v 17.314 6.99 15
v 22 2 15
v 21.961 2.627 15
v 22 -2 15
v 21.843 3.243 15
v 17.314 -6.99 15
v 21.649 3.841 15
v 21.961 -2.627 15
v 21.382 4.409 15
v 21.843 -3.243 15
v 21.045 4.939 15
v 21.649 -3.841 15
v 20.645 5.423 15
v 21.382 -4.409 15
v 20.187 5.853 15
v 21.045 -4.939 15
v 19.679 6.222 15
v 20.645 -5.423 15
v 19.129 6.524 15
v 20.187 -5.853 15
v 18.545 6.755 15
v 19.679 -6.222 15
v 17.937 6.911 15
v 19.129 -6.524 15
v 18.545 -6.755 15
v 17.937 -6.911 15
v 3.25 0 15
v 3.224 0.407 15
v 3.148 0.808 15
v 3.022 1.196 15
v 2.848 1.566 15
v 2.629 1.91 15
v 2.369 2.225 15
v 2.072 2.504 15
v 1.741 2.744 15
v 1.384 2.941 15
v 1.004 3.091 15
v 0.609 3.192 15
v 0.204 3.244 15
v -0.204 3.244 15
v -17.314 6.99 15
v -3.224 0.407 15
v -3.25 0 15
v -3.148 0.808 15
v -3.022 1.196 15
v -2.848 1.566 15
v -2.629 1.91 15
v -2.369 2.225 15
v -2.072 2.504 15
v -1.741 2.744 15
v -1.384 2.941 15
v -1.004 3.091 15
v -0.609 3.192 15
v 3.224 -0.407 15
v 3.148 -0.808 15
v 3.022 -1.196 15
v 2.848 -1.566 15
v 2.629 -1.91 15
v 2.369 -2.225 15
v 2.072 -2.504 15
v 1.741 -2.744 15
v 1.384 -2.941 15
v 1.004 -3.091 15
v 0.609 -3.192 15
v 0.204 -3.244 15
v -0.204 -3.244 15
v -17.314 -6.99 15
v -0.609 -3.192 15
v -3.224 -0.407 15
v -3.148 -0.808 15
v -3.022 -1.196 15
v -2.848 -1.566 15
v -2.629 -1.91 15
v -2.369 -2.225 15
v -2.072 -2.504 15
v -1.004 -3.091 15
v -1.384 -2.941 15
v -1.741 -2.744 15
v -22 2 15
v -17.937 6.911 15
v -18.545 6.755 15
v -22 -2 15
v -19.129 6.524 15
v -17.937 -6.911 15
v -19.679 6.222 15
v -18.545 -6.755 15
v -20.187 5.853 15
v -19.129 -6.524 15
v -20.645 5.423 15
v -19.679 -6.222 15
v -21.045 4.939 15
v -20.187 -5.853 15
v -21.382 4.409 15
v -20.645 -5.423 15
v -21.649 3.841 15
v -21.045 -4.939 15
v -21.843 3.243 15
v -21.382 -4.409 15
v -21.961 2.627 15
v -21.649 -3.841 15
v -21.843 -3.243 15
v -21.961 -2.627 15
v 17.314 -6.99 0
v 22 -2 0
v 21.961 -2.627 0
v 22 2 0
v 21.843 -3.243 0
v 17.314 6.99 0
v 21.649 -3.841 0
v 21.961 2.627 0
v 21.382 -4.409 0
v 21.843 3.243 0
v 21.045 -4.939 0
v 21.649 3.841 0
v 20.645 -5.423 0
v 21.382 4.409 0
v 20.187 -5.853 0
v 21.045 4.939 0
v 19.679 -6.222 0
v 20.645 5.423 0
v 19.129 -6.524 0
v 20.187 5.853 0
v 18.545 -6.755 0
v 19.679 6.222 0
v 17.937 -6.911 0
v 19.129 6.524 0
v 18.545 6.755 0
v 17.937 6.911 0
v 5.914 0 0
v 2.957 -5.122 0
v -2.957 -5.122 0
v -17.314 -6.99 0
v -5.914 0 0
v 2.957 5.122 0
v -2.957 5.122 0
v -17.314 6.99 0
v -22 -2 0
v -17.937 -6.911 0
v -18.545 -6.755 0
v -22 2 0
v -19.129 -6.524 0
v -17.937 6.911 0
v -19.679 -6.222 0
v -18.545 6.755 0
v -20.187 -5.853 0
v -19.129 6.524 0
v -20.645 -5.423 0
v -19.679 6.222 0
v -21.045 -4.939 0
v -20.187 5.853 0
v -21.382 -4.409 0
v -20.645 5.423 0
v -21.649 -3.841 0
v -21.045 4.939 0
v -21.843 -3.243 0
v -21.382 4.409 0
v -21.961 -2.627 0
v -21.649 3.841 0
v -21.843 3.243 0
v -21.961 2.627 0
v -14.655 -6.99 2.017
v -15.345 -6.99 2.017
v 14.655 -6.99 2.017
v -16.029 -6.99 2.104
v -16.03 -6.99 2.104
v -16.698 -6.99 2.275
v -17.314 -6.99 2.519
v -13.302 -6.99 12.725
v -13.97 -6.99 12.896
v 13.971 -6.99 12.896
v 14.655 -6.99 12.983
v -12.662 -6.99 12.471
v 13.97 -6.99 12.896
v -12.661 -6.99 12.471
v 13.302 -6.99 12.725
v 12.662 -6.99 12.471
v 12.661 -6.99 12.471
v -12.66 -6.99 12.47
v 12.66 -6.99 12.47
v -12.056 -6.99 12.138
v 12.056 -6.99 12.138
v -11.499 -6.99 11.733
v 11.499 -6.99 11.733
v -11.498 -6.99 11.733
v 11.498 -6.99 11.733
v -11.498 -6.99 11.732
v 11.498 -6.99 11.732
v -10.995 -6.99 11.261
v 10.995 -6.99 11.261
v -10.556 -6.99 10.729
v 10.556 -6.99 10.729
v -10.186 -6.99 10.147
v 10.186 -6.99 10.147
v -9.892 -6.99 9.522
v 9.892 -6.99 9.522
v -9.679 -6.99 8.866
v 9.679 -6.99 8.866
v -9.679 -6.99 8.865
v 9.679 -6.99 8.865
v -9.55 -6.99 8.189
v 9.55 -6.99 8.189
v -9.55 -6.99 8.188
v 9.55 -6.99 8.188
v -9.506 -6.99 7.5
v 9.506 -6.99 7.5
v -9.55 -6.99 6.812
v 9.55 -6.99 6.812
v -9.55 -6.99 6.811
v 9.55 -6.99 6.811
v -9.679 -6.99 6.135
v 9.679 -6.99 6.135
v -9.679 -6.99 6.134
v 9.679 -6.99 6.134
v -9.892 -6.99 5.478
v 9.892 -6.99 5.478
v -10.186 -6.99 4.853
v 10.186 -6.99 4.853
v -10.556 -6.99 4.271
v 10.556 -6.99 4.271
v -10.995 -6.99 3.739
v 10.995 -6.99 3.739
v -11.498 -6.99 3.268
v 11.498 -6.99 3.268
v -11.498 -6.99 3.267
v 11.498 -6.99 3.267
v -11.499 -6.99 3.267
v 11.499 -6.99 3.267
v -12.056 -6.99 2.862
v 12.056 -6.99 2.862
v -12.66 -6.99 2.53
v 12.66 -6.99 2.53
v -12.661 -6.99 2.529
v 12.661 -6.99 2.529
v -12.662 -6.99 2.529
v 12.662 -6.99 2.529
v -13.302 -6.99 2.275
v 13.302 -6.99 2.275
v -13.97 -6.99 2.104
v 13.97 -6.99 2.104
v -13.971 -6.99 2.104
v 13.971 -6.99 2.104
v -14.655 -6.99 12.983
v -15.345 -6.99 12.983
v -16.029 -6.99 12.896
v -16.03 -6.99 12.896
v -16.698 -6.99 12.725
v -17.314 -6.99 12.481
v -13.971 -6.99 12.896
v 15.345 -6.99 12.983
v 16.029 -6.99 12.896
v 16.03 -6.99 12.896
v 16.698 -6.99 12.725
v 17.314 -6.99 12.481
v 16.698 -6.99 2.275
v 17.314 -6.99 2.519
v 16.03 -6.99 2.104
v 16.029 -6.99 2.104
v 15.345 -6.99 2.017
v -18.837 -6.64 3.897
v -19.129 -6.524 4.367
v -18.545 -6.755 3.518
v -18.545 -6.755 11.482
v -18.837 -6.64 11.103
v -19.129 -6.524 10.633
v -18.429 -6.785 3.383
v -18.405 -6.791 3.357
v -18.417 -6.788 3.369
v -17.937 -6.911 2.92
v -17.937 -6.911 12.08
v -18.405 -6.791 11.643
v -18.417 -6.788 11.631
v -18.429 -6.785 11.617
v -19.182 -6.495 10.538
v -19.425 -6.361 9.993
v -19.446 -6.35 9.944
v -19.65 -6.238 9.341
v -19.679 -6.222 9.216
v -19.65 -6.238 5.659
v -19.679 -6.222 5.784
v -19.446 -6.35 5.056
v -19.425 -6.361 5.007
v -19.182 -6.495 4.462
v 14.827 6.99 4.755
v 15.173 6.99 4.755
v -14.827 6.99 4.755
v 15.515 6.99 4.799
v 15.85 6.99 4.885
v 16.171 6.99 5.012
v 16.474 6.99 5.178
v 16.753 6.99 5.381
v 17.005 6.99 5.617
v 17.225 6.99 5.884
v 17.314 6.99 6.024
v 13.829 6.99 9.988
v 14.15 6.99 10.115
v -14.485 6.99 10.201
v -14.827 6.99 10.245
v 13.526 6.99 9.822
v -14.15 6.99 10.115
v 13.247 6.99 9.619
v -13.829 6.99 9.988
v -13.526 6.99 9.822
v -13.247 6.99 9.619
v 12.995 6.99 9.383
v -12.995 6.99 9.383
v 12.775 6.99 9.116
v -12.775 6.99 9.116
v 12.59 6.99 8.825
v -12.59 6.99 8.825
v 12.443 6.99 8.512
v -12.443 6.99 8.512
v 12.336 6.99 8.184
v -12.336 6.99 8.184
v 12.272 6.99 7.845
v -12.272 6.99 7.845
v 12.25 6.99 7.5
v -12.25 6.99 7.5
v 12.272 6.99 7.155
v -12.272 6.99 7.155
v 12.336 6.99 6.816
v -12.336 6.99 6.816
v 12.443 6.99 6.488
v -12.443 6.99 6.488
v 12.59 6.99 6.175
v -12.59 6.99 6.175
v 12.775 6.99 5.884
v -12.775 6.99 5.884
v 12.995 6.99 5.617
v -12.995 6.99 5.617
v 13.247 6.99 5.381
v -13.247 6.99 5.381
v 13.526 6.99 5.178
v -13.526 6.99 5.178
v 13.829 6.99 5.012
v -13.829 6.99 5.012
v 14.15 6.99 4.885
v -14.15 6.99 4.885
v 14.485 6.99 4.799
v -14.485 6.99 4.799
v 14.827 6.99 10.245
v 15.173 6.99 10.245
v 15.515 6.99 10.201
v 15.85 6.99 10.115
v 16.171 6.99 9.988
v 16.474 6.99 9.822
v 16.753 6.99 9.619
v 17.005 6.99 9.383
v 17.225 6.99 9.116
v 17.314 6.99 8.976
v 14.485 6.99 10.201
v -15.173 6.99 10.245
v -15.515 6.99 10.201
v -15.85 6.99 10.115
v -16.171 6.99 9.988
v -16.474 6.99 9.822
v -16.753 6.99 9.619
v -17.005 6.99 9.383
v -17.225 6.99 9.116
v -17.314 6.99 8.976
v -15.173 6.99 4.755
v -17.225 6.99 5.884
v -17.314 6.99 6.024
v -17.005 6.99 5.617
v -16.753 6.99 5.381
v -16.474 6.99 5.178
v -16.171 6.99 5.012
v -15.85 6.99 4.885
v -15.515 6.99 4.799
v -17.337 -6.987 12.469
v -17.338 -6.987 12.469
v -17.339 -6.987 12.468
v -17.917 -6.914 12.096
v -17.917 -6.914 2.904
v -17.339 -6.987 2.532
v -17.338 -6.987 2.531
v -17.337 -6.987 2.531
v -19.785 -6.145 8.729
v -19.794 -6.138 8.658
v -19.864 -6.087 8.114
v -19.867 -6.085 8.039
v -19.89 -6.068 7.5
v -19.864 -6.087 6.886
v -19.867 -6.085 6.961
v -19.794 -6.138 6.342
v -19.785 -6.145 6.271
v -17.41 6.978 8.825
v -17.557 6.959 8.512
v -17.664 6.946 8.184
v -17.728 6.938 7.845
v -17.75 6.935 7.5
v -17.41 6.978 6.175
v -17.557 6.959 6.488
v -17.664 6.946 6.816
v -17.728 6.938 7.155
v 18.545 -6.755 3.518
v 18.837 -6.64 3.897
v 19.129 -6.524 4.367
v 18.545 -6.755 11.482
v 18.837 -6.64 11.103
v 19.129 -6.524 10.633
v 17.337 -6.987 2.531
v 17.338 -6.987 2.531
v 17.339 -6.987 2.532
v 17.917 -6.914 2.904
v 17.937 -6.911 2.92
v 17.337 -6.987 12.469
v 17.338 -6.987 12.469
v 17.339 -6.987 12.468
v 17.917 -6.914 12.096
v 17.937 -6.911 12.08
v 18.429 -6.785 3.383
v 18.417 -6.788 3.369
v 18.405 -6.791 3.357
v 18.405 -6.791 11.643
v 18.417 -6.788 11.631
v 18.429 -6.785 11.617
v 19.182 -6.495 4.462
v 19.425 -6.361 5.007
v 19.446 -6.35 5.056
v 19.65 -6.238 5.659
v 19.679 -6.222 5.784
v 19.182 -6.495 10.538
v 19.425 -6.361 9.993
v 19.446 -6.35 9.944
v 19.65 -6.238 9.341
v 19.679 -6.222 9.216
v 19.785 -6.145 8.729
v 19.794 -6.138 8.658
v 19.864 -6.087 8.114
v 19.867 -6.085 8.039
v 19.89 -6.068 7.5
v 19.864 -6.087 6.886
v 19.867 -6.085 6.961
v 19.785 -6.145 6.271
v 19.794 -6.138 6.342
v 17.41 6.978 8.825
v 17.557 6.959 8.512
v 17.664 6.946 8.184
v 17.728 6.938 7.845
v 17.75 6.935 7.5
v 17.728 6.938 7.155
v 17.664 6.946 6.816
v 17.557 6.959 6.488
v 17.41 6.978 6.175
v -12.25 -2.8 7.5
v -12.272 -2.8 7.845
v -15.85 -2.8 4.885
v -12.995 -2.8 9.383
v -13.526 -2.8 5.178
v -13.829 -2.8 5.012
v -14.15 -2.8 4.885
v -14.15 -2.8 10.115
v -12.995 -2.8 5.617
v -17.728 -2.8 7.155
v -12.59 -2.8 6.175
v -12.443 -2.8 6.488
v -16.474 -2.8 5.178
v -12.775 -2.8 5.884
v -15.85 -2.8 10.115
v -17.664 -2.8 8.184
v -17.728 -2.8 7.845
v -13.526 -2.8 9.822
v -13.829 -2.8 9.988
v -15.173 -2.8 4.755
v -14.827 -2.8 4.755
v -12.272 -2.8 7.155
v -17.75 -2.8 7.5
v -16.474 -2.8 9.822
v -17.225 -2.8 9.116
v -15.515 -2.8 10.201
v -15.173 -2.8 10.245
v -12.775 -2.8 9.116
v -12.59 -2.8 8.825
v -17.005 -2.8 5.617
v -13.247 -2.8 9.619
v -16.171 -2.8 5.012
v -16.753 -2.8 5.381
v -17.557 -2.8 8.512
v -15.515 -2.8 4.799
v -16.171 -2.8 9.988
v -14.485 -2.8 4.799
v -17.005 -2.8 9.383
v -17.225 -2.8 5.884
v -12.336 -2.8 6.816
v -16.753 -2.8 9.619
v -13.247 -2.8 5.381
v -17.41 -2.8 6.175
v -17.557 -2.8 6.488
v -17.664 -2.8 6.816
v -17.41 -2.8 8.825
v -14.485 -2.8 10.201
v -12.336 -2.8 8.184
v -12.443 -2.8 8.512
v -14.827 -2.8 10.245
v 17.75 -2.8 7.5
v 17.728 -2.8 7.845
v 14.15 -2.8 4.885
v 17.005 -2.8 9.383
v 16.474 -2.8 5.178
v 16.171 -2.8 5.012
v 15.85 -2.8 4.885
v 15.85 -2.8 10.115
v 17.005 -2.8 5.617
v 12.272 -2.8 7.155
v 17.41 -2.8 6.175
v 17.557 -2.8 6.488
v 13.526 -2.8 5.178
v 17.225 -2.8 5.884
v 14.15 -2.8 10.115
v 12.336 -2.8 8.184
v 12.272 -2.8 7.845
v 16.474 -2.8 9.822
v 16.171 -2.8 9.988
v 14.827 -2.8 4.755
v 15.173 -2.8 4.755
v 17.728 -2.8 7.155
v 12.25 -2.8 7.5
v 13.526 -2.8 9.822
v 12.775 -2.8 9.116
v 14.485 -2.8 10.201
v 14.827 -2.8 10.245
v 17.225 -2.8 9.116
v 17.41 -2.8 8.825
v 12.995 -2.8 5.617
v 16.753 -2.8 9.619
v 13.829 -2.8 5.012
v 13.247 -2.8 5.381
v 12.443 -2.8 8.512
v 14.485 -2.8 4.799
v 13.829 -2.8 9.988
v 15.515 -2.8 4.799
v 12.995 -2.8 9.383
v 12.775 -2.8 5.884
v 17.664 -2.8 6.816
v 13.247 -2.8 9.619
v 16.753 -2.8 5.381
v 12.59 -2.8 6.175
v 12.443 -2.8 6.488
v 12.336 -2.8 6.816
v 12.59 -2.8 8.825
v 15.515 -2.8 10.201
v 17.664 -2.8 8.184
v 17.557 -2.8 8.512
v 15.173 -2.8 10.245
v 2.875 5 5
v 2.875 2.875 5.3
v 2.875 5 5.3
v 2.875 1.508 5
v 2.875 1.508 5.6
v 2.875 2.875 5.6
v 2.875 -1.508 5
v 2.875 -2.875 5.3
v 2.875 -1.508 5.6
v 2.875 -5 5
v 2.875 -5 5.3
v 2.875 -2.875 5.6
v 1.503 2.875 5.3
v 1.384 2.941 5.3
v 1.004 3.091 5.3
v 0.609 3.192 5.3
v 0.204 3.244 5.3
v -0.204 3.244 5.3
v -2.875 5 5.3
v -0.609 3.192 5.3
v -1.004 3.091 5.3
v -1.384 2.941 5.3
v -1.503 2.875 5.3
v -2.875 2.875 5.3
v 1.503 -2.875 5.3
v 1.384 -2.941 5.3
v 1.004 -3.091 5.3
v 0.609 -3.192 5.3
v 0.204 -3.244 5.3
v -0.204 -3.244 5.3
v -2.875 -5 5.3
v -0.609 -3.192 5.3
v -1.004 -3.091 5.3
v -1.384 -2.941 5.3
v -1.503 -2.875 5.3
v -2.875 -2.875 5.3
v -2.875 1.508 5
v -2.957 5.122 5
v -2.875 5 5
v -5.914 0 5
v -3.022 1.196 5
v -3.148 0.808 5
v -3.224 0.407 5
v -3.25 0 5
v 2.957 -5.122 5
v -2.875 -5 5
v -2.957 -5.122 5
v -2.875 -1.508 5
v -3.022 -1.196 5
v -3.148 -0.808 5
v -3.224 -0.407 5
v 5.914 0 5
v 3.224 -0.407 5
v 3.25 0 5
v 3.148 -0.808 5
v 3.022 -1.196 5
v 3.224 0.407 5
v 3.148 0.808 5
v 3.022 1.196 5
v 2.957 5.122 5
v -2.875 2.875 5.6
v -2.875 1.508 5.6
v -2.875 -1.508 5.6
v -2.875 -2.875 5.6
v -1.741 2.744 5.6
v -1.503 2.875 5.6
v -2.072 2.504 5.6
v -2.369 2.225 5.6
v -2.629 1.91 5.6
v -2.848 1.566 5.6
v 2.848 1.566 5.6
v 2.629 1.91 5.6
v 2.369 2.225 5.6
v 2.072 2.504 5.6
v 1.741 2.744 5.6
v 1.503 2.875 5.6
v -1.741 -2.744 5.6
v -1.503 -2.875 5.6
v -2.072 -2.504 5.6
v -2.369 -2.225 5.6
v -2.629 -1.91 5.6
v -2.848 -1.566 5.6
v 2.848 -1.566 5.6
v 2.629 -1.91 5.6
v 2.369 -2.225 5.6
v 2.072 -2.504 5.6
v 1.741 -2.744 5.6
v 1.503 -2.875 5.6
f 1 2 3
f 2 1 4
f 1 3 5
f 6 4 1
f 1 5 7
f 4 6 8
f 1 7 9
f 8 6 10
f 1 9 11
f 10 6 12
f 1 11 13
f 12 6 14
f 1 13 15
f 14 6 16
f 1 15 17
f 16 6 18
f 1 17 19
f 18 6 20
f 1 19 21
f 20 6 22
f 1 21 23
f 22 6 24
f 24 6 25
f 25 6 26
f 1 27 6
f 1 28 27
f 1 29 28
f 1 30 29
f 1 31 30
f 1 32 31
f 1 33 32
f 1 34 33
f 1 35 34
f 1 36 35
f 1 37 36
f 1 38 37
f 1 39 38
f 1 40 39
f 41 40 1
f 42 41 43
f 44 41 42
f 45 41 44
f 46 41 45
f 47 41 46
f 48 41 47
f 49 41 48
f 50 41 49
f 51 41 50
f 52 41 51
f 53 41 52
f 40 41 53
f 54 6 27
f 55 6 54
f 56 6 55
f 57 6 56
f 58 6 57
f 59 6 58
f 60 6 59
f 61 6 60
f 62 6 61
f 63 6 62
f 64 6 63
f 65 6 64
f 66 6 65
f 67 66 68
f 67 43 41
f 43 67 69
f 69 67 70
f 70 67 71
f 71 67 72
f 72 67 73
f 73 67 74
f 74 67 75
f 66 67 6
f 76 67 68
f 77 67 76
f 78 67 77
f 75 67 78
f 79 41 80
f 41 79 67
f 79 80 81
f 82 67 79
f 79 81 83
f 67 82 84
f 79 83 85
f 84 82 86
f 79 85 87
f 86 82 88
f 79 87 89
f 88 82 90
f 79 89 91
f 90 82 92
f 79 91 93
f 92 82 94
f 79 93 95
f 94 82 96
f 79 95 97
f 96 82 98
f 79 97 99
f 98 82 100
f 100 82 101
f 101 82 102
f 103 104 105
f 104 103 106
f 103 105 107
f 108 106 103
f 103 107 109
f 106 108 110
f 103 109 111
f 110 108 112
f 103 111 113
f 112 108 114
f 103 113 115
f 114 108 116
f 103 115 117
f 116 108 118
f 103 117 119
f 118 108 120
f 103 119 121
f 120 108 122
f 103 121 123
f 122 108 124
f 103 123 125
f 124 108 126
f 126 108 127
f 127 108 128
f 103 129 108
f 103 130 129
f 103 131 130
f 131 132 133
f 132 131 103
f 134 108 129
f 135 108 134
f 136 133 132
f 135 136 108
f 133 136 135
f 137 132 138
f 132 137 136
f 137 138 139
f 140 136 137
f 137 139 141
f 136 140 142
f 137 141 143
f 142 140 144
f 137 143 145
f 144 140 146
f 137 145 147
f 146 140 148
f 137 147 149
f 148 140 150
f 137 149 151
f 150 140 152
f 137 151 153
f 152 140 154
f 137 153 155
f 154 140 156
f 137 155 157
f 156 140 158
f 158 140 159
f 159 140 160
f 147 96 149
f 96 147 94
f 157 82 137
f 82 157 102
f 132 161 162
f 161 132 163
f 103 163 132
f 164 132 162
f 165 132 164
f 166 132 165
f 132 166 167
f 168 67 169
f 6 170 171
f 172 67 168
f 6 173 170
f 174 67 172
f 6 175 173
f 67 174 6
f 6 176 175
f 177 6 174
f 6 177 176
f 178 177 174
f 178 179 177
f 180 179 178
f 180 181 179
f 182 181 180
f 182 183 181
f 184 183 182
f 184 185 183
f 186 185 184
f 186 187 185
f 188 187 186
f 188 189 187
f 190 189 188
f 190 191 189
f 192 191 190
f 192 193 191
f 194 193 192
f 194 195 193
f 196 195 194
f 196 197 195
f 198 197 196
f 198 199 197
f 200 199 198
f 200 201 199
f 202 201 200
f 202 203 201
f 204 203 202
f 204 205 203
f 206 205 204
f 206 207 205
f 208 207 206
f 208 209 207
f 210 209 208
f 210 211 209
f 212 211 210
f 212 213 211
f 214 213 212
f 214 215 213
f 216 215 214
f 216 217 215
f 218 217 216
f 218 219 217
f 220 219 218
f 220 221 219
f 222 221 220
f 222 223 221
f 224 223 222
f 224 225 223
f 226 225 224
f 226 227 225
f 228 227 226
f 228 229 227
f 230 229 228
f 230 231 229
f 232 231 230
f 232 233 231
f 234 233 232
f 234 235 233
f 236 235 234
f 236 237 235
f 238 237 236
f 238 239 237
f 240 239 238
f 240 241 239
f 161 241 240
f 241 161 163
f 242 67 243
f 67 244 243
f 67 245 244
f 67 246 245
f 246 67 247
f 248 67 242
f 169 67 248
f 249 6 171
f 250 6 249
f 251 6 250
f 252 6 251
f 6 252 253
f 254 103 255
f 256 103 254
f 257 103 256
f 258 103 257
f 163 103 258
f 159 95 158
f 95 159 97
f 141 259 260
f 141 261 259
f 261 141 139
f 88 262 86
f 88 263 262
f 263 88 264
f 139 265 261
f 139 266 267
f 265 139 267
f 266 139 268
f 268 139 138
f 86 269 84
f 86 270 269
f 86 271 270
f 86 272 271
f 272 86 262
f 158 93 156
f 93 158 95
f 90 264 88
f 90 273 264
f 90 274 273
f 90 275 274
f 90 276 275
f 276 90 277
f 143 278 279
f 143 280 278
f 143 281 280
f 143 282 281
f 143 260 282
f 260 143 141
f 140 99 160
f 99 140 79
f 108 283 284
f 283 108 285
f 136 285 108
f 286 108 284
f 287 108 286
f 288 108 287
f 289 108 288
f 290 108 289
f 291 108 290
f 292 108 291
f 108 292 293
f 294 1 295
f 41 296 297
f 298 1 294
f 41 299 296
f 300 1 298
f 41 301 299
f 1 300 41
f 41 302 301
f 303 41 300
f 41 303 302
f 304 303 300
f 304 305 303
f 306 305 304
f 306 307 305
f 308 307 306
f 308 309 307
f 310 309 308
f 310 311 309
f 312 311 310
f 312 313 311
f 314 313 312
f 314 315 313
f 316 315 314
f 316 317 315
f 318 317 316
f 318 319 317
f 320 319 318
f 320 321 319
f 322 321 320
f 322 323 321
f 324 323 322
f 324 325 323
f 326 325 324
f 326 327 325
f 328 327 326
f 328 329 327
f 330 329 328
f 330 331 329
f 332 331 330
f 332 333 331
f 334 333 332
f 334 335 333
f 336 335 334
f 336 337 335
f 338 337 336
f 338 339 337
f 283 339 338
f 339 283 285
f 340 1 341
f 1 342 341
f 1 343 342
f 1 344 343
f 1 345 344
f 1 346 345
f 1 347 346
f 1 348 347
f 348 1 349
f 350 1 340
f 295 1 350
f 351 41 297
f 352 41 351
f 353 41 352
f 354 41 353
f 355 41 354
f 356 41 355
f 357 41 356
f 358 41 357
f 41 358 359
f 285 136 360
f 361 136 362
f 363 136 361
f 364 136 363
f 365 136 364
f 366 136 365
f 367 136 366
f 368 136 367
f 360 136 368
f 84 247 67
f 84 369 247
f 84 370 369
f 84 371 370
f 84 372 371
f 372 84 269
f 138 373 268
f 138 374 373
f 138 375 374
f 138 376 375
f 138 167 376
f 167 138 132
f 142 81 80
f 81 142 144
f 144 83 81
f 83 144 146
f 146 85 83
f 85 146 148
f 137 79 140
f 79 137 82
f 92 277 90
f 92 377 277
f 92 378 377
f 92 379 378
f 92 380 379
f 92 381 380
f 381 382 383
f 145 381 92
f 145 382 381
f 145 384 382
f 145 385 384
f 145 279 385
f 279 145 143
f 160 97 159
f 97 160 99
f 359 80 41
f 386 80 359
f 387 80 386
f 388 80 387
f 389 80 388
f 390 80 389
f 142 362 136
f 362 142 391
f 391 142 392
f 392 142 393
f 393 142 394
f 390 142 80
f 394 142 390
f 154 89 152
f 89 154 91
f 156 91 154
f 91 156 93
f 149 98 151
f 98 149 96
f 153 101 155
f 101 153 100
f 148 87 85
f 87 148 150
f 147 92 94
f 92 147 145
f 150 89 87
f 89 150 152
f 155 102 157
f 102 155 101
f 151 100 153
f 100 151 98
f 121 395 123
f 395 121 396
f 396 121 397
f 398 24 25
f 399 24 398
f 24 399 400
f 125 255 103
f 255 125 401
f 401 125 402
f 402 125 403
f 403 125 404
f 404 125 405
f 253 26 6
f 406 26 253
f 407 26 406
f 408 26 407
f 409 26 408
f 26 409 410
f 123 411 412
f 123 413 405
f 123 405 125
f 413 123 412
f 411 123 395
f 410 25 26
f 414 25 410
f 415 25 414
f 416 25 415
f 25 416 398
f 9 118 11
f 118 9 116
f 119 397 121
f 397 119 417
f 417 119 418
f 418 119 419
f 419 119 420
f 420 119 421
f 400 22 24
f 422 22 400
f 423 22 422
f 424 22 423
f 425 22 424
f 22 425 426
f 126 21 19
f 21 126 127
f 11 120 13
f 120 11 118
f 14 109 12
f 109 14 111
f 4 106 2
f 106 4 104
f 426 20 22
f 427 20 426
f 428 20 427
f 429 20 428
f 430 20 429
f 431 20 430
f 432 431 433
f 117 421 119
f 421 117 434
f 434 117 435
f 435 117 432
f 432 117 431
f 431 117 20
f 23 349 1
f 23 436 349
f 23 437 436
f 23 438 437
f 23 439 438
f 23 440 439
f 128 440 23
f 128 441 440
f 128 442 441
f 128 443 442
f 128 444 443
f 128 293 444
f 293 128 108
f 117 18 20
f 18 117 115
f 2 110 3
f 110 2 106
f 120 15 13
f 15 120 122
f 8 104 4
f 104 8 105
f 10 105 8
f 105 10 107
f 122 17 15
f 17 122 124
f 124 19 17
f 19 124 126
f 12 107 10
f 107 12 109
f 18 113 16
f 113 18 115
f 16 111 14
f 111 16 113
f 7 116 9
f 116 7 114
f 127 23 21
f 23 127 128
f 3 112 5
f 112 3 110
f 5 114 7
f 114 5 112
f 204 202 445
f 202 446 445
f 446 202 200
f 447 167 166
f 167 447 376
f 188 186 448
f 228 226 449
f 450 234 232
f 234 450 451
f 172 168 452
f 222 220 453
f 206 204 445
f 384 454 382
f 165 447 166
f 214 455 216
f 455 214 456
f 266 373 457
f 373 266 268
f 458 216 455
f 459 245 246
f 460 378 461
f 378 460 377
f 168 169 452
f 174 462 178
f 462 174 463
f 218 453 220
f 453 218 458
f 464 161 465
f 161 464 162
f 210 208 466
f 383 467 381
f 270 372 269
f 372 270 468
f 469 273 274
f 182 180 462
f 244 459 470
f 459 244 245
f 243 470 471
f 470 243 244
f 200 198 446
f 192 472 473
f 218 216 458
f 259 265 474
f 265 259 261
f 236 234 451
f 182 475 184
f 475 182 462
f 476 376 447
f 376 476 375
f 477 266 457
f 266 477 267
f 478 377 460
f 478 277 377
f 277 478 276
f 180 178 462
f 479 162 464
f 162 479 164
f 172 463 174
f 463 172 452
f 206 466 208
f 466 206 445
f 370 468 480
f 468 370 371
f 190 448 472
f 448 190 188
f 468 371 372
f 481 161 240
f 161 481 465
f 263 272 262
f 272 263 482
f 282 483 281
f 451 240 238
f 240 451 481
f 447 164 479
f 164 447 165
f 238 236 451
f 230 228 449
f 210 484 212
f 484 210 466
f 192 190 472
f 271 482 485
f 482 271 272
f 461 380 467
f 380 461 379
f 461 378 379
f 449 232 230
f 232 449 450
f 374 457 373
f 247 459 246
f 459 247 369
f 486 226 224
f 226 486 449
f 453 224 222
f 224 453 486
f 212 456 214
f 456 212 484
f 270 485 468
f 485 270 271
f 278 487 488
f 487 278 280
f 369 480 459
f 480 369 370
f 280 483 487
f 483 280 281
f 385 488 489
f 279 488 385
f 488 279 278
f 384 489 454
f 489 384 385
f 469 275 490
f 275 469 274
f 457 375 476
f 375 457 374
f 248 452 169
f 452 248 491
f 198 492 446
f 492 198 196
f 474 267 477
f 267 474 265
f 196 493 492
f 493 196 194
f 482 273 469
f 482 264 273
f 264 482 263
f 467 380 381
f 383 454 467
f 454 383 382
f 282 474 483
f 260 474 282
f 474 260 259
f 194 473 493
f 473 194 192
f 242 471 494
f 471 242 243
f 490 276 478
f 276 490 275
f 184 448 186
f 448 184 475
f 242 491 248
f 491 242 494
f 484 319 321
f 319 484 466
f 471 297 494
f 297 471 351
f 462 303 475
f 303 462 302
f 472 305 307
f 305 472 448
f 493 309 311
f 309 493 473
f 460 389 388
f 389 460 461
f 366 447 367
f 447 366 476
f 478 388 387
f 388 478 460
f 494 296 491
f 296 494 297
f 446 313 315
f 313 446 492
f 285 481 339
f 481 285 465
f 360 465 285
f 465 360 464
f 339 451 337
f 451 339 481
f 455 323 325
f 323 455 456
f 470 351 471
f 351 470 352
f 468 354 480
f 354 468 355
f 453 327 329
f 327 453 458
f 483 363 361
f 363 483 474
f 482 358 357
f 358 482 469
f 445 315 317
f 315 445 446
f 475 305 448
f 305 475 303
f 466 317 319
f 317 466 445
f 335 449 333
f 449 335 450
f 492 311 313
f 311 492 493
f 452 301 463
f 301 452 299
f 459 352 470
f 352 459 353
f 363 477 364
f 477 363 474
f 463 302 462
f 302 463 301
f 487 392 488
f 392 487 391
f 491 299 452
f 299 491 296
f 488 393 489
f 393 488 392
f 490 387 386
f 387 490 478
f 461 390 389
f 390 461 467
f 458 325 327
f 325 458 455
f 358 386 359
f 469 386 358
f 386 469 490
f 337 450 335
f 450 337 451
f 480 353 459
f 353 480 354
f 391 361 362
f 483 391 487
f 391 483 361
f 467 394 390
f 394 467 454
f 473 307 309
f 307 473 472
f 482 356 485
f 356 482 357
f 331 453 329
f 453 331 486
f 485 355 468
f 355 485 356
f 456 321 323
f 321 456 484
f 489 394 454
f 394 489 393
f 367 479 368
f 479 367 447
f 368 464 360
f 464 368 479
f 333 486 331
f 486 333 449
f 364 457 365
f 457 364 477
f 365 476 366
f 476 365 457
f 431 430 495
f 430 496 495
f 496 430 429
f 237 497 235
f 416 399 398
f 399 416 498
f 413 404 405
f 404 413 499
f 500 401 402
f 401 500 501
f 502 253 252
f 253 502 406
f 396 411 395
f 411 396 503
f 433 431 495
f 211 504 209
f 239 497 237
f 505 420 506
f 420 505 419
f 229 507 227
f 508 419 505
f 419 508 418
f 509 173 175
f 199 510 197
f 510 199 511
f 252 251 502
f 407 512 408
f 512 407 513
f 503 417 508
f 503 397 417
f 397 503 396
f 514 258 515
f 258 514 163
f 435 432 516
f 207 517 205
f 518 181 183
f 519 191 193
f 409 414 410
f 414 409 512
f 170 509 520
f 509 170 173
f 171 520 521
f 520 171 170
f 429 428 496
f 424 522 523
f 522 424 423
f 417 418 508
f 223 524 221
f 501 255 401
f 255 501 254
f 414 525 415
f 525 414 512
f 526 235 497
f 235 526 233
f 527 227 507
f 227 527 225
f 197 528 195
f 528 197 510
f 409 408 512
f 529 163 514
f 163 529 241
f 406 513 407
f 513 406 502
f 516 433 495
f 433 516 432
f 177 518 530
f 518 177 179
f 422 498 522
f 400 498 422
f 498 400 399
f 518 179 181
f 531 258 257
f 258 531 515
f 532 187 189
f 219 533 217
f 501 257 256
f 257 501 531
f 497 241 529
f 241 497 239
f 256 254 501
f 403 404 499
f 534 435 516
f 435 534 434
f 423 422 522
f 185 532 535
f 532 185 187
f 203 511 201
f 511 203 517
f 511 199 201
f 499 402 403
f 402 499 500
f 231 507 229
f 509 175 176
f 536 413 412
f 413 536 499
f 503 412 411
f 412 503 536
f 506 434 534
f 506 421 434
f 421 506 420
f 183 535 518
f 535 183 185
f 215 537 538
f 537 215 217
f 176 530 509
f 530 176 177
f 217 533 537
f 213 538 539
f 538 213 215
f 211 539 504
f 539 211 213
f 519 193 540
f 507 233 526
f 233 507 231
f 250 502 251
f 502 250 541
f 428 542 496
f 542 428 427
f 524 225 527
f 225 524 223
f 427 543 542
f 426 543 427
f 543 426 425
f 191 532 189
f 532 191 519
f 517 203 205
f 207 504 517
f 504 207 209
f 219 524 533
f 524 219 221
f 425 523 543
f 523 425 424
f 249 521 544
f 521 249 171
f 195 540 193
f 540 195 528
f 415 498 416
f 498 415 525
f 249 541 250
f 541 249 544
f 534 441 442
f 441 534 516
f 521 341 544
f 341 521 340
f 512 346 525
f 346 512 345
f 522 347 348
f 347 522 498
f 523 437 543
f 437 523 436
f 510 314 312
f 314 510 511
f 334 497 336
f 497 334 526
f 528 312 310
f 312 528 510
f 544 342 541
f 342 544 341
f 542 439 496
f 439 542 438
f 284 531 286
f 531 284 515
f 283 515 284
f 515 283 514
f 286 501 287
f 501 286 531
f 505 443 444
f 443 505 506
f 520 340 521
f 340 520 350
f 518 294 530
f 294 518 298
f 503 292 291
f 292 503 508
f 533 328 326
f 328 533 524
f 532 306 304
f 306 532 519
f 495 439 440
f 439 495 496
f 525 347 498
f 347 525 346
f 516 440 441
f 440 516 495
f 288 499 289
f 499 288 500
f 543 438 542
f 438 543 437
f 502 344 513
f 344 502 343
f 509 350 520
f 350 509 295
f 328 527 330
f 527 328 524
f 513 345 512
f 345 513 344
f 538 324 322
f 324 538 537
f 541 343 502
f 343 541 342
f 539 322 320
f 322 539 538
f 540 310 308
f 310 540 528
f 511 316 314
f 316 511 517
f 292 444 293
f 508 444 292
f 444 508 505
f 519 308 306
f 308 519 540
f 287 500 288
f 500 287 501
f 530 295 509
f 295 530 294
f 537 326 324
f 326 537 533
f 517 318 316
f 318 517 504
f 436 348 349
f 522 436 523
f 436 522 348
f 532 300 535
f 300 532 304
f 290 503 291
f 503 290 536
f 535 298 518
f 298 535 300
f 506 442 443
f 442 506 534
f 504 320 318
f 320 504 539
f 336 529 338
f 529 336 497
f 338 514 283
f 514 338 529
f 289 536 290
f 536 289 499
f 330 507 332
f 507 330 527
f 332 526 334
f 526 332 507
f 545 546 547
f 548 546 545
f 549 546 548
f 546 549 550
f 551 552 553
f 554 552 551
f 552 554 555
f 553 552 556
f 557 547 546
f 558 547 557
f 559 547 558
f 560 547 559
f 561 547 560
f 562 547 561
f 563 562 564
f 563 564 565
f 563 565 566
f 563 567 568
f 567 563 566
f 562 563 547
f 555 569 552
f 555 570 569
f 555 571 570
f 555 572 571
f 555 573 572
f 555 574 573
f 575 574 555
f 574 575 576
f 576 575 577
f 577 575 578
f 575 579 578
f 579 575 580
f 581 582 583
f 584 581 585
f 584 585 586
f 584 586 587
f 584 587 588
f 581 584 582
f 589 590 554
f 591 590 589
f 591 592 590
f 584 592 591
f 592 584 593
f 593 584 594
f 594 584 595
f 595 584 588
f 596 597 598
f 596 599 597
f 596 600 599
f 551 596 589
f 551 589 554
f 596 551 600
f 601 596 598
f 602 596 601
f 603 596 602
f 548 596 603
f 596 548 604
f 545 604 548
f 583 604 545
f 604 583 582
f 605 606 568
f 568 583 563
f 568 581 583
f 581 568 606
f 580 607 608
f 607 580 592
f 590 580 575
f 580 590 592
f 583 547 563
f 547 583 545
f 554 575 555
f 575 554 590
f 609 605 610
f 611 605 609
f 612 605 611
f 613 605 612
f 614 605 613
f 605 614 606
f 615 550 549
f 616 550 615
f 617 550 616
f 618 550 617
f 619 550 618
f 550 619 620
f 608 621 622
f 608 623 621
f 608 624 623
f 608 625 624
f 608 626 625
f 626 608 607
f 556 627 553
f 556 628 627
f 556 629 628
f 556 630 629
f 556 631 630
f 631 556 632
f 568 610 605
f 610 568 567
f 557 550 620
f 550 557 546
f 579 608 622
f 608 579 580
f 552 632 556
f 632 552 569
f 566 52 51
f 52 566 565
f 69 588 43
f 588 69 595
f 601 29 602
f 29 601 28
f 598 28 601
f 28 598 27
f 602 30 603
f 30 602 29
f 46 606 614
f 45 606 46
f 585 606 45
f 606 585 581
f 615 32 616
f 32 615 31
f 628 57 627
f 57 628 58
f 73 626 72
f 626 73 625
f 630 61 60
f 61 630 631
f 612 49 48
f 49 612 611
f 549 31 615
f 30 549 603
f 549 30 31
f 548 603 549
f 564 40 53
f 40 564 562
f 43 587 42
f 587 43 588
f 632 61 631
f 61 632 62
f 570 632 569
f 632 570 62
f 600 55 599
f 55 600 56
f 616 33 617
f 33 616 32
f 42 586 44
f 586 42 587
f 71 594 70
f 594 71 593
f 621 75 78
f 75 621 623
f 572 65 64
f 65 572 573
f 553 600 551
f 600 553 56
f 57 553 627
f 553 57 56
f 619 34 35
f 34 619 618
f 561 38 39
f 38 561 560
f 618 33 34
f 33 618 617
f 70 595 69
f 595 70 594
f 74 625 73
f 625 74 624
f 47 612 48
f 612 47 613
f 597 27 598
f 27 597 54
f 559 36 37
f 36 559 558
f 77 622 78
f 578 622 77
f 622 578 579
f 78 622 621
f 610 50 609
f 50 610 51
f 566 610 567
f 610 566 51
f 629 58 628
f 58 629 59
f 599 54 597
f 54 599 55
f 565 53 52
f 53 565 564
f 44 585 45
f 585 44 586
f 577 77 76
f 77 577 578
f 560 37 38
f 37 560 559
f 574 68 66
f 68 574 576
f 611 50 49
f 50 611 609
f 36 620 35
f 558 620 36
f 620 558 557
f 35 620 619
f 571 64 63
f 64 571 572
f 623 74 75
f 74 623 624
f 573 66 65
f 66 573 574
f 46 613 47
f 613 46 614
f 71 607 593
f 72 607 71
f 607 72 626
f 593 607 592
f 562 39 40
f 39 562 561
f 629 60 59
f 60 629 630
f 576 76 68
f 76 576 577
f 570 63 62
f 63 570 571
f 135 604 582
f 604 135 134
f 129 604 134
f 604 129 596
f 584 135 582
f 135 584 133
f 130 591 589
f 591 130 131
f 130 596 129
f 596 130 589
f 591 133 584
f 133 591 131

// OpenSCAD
$fn = 50;


difference() {
	union() {
		cylinder(h = 15, r = 7.0000000000);
		translate(v = [-7.5000000000, 0.0000000000, 0]) {
			hull() {
				translate(v = [-9.5000000000, 2.0000000000, 0]) {
					cylinder(h = 15, r = 5);
				}
				translate(v = [9.5000000000, 2.0000000000, 0]) {
					cylinder(h = 15, r = 5);
				}
				translate(v = [-9.5000000000, -2.0000000000, 0]) {
					cylinder(h = 15, r = 5);
				}
				translate(v = [9.5000000000, -2.0000000000, 0]) {
					cylinder(h = 15, r = 5);
				}
			}
		}
		translate(v = [7.5000000000, 0.0000000000, 0]) {
			hull() {
				translate(v = [-9.5000000000, 2.0000000000, 0]) {
					cylinder(h = 15, r = 5);
				}
				translate(v = [9.5000000000, 2.0000000000, 0]) {
					cylinder(h = 15, r = 5);
				}
				translate(v = [-9.5000000000, -2.0000000000, 0]) {
					cylinder(h = 15, r = 5);
				}
				translate(v = [9.5000000000, -2.0000000000, 0]) {
					cylinder(h = 15, r = 5);
				}
			}
		}
	}
	union() {
		translate(v = [-15.0000000000, -7.0000000000, 7.5000000000]) {
			rotate(a = [90, 0, 0]) {
				difference() {
					union() {
						#translate(v = [0, 0, -14.0000000000]) {
							cylinder(h = 14, r = 2.2500000000);
						}
						#translate(v = [0, 0, -4.2000000000]) {
							cylinder(h = 4.2000000000, r1 = 2.7500000000, r2 = 5.5000000000);
						}
						#translate(v = [0, 0, -14.0000000000]) {
							cylinder(h = 14, r = 2.7500000000);
						}
						#translate(v = [0, 0, -14.0000000000]) {
							cylinder(h = 14, r = 2.2500000000);
						}
					}
					union();
				}
			}
		}
		translate(v = [15.0000000000, -7.0000000000, 7.5000000000]) {
			rotate(a = [90, 0, 0]) {
				difference() {
					union() {
						#translate(v = [0, 0, -14.0000000000]) {
							cylinder(h = 14, r = 2.2500000000);
						}
						#translate(v = [0, 0, -4.2000000000]) {
							cylinder(h = 4.2000000000, r1 = 2.7500000000, r2 = 5.5000000000);
						}
						#translate(v = [0, 0, -14.0000000000]) {
							cylinder(h = 14, r = 2.7500000000);
						}
						#translate(v = [0, 0, -14.0000000000]) {
							cylinder(h = 14, r = 2.2500000000);
						}
					}
					union();
				}
			}
		}
		translate(v = [0.0000000000, 0.0000000000, 0]) {
			rotate(a = [0, 0, 0]) {
				difference() {
					union() {
						#translate(v = [-2.8750000000, -5.0000000000, -0.3000000000]) {
							cube(size = [5.7500000000, 10, 0.3000000000]);
						}
						#translate(v = [-2.8750000000, -2.8750000000, -0.6000000000]) {
							cube(size = [5.7500000000, 5.7500000000, 0.3000000000]);
						}
						#translate(v = [-2.8750000000, -5.0000000000, 5]) {
							cube(size = [5.7500000000, 10, 0.3000000000]);
						}
						#translate(v = [-2.8750000000, -2.8750000000, 5.3000000000]) {
							cube(size = [5.7500000000, 5.7500000000, 0.3000000000]);
						}
						#translate(v = [0, 0, -100.0000000000]) {
							cylinder(h = 200, r = 3.2500000000);
						}
						#linear_extrude(height = 5) {
							polygon(points = [[5.9142500000, 0.0000000000], [2.9571250000, 5.1218907443], [-2.9571250000, 5.1218907443], [-5.9142500000, 0.0000000000], [-2.9571250000, -5.1218907443], [2.9571250000, -5.1218907443]]);
						}
						#translate(v = [-2.8750000000, -5.0000000000, -0.3000000000]) {
							cube(size = [5.7500000000, 10, 0.3000000000]);
						}
						#translate(v = [-2.8750000000, -2.8750000000, -0.6000000000]) {
							cube(size = [5.7500000000, 5.7500000000, 0.3000000000]);
						}
						#translate(v = [-2.8750000000, -5.0000000000, 5]) {
							cube(size = [5.7500000000, 10, 0.3000000000]);
						}
						#translate(v = [-2.8750000000, -2.8750000000, 5.3000000000]) {
							cube(size = [5.7500000000, 5.7500000000, 0.3000000000]);
						}
						#translate(v = [0, 0, -100.0000000000]) {
							cylinder(h = 200, r = 3.2500000000);
						}
						#translate(v = [-2.8750000000, -5.0000000000, -0.3000000000]) {
							cube(size = [5.7500000000, 10, 0.3000000000]);
						}
						#translate(v = [-2.8750000000, -2.8750000000, -0.6000000000]) {
							cube(size = [5.7500000000, 5.7500000000, 0.3000000000]);
						}
						#translate(v = [-2.8750000000, -5.0000000000, 5]) {
							cube(size = [5.7500000000, 10, 0.3000000000]);
						}
						#translate(v = [-2.8750000000, -2.8750000000, 5.3000000000]) {
							cube(size = [5.7500000000, 5.7500000000, 0.3000000000]);
						}
						#translate(v = [0, 0, -100.0000000000]) {
							cylinder(h = 200, r = 3.2500000000);
						}
					}
					union();
				}
			}
		}
		translate(v = [0, 0, -100]) {
			cylinder(h = 200, r = 3.2500000000);
		}
		translate(v = [0, 0, -100]) {
			cylinder(h = 200, r = 1.8000000000);
		}
	}
}
